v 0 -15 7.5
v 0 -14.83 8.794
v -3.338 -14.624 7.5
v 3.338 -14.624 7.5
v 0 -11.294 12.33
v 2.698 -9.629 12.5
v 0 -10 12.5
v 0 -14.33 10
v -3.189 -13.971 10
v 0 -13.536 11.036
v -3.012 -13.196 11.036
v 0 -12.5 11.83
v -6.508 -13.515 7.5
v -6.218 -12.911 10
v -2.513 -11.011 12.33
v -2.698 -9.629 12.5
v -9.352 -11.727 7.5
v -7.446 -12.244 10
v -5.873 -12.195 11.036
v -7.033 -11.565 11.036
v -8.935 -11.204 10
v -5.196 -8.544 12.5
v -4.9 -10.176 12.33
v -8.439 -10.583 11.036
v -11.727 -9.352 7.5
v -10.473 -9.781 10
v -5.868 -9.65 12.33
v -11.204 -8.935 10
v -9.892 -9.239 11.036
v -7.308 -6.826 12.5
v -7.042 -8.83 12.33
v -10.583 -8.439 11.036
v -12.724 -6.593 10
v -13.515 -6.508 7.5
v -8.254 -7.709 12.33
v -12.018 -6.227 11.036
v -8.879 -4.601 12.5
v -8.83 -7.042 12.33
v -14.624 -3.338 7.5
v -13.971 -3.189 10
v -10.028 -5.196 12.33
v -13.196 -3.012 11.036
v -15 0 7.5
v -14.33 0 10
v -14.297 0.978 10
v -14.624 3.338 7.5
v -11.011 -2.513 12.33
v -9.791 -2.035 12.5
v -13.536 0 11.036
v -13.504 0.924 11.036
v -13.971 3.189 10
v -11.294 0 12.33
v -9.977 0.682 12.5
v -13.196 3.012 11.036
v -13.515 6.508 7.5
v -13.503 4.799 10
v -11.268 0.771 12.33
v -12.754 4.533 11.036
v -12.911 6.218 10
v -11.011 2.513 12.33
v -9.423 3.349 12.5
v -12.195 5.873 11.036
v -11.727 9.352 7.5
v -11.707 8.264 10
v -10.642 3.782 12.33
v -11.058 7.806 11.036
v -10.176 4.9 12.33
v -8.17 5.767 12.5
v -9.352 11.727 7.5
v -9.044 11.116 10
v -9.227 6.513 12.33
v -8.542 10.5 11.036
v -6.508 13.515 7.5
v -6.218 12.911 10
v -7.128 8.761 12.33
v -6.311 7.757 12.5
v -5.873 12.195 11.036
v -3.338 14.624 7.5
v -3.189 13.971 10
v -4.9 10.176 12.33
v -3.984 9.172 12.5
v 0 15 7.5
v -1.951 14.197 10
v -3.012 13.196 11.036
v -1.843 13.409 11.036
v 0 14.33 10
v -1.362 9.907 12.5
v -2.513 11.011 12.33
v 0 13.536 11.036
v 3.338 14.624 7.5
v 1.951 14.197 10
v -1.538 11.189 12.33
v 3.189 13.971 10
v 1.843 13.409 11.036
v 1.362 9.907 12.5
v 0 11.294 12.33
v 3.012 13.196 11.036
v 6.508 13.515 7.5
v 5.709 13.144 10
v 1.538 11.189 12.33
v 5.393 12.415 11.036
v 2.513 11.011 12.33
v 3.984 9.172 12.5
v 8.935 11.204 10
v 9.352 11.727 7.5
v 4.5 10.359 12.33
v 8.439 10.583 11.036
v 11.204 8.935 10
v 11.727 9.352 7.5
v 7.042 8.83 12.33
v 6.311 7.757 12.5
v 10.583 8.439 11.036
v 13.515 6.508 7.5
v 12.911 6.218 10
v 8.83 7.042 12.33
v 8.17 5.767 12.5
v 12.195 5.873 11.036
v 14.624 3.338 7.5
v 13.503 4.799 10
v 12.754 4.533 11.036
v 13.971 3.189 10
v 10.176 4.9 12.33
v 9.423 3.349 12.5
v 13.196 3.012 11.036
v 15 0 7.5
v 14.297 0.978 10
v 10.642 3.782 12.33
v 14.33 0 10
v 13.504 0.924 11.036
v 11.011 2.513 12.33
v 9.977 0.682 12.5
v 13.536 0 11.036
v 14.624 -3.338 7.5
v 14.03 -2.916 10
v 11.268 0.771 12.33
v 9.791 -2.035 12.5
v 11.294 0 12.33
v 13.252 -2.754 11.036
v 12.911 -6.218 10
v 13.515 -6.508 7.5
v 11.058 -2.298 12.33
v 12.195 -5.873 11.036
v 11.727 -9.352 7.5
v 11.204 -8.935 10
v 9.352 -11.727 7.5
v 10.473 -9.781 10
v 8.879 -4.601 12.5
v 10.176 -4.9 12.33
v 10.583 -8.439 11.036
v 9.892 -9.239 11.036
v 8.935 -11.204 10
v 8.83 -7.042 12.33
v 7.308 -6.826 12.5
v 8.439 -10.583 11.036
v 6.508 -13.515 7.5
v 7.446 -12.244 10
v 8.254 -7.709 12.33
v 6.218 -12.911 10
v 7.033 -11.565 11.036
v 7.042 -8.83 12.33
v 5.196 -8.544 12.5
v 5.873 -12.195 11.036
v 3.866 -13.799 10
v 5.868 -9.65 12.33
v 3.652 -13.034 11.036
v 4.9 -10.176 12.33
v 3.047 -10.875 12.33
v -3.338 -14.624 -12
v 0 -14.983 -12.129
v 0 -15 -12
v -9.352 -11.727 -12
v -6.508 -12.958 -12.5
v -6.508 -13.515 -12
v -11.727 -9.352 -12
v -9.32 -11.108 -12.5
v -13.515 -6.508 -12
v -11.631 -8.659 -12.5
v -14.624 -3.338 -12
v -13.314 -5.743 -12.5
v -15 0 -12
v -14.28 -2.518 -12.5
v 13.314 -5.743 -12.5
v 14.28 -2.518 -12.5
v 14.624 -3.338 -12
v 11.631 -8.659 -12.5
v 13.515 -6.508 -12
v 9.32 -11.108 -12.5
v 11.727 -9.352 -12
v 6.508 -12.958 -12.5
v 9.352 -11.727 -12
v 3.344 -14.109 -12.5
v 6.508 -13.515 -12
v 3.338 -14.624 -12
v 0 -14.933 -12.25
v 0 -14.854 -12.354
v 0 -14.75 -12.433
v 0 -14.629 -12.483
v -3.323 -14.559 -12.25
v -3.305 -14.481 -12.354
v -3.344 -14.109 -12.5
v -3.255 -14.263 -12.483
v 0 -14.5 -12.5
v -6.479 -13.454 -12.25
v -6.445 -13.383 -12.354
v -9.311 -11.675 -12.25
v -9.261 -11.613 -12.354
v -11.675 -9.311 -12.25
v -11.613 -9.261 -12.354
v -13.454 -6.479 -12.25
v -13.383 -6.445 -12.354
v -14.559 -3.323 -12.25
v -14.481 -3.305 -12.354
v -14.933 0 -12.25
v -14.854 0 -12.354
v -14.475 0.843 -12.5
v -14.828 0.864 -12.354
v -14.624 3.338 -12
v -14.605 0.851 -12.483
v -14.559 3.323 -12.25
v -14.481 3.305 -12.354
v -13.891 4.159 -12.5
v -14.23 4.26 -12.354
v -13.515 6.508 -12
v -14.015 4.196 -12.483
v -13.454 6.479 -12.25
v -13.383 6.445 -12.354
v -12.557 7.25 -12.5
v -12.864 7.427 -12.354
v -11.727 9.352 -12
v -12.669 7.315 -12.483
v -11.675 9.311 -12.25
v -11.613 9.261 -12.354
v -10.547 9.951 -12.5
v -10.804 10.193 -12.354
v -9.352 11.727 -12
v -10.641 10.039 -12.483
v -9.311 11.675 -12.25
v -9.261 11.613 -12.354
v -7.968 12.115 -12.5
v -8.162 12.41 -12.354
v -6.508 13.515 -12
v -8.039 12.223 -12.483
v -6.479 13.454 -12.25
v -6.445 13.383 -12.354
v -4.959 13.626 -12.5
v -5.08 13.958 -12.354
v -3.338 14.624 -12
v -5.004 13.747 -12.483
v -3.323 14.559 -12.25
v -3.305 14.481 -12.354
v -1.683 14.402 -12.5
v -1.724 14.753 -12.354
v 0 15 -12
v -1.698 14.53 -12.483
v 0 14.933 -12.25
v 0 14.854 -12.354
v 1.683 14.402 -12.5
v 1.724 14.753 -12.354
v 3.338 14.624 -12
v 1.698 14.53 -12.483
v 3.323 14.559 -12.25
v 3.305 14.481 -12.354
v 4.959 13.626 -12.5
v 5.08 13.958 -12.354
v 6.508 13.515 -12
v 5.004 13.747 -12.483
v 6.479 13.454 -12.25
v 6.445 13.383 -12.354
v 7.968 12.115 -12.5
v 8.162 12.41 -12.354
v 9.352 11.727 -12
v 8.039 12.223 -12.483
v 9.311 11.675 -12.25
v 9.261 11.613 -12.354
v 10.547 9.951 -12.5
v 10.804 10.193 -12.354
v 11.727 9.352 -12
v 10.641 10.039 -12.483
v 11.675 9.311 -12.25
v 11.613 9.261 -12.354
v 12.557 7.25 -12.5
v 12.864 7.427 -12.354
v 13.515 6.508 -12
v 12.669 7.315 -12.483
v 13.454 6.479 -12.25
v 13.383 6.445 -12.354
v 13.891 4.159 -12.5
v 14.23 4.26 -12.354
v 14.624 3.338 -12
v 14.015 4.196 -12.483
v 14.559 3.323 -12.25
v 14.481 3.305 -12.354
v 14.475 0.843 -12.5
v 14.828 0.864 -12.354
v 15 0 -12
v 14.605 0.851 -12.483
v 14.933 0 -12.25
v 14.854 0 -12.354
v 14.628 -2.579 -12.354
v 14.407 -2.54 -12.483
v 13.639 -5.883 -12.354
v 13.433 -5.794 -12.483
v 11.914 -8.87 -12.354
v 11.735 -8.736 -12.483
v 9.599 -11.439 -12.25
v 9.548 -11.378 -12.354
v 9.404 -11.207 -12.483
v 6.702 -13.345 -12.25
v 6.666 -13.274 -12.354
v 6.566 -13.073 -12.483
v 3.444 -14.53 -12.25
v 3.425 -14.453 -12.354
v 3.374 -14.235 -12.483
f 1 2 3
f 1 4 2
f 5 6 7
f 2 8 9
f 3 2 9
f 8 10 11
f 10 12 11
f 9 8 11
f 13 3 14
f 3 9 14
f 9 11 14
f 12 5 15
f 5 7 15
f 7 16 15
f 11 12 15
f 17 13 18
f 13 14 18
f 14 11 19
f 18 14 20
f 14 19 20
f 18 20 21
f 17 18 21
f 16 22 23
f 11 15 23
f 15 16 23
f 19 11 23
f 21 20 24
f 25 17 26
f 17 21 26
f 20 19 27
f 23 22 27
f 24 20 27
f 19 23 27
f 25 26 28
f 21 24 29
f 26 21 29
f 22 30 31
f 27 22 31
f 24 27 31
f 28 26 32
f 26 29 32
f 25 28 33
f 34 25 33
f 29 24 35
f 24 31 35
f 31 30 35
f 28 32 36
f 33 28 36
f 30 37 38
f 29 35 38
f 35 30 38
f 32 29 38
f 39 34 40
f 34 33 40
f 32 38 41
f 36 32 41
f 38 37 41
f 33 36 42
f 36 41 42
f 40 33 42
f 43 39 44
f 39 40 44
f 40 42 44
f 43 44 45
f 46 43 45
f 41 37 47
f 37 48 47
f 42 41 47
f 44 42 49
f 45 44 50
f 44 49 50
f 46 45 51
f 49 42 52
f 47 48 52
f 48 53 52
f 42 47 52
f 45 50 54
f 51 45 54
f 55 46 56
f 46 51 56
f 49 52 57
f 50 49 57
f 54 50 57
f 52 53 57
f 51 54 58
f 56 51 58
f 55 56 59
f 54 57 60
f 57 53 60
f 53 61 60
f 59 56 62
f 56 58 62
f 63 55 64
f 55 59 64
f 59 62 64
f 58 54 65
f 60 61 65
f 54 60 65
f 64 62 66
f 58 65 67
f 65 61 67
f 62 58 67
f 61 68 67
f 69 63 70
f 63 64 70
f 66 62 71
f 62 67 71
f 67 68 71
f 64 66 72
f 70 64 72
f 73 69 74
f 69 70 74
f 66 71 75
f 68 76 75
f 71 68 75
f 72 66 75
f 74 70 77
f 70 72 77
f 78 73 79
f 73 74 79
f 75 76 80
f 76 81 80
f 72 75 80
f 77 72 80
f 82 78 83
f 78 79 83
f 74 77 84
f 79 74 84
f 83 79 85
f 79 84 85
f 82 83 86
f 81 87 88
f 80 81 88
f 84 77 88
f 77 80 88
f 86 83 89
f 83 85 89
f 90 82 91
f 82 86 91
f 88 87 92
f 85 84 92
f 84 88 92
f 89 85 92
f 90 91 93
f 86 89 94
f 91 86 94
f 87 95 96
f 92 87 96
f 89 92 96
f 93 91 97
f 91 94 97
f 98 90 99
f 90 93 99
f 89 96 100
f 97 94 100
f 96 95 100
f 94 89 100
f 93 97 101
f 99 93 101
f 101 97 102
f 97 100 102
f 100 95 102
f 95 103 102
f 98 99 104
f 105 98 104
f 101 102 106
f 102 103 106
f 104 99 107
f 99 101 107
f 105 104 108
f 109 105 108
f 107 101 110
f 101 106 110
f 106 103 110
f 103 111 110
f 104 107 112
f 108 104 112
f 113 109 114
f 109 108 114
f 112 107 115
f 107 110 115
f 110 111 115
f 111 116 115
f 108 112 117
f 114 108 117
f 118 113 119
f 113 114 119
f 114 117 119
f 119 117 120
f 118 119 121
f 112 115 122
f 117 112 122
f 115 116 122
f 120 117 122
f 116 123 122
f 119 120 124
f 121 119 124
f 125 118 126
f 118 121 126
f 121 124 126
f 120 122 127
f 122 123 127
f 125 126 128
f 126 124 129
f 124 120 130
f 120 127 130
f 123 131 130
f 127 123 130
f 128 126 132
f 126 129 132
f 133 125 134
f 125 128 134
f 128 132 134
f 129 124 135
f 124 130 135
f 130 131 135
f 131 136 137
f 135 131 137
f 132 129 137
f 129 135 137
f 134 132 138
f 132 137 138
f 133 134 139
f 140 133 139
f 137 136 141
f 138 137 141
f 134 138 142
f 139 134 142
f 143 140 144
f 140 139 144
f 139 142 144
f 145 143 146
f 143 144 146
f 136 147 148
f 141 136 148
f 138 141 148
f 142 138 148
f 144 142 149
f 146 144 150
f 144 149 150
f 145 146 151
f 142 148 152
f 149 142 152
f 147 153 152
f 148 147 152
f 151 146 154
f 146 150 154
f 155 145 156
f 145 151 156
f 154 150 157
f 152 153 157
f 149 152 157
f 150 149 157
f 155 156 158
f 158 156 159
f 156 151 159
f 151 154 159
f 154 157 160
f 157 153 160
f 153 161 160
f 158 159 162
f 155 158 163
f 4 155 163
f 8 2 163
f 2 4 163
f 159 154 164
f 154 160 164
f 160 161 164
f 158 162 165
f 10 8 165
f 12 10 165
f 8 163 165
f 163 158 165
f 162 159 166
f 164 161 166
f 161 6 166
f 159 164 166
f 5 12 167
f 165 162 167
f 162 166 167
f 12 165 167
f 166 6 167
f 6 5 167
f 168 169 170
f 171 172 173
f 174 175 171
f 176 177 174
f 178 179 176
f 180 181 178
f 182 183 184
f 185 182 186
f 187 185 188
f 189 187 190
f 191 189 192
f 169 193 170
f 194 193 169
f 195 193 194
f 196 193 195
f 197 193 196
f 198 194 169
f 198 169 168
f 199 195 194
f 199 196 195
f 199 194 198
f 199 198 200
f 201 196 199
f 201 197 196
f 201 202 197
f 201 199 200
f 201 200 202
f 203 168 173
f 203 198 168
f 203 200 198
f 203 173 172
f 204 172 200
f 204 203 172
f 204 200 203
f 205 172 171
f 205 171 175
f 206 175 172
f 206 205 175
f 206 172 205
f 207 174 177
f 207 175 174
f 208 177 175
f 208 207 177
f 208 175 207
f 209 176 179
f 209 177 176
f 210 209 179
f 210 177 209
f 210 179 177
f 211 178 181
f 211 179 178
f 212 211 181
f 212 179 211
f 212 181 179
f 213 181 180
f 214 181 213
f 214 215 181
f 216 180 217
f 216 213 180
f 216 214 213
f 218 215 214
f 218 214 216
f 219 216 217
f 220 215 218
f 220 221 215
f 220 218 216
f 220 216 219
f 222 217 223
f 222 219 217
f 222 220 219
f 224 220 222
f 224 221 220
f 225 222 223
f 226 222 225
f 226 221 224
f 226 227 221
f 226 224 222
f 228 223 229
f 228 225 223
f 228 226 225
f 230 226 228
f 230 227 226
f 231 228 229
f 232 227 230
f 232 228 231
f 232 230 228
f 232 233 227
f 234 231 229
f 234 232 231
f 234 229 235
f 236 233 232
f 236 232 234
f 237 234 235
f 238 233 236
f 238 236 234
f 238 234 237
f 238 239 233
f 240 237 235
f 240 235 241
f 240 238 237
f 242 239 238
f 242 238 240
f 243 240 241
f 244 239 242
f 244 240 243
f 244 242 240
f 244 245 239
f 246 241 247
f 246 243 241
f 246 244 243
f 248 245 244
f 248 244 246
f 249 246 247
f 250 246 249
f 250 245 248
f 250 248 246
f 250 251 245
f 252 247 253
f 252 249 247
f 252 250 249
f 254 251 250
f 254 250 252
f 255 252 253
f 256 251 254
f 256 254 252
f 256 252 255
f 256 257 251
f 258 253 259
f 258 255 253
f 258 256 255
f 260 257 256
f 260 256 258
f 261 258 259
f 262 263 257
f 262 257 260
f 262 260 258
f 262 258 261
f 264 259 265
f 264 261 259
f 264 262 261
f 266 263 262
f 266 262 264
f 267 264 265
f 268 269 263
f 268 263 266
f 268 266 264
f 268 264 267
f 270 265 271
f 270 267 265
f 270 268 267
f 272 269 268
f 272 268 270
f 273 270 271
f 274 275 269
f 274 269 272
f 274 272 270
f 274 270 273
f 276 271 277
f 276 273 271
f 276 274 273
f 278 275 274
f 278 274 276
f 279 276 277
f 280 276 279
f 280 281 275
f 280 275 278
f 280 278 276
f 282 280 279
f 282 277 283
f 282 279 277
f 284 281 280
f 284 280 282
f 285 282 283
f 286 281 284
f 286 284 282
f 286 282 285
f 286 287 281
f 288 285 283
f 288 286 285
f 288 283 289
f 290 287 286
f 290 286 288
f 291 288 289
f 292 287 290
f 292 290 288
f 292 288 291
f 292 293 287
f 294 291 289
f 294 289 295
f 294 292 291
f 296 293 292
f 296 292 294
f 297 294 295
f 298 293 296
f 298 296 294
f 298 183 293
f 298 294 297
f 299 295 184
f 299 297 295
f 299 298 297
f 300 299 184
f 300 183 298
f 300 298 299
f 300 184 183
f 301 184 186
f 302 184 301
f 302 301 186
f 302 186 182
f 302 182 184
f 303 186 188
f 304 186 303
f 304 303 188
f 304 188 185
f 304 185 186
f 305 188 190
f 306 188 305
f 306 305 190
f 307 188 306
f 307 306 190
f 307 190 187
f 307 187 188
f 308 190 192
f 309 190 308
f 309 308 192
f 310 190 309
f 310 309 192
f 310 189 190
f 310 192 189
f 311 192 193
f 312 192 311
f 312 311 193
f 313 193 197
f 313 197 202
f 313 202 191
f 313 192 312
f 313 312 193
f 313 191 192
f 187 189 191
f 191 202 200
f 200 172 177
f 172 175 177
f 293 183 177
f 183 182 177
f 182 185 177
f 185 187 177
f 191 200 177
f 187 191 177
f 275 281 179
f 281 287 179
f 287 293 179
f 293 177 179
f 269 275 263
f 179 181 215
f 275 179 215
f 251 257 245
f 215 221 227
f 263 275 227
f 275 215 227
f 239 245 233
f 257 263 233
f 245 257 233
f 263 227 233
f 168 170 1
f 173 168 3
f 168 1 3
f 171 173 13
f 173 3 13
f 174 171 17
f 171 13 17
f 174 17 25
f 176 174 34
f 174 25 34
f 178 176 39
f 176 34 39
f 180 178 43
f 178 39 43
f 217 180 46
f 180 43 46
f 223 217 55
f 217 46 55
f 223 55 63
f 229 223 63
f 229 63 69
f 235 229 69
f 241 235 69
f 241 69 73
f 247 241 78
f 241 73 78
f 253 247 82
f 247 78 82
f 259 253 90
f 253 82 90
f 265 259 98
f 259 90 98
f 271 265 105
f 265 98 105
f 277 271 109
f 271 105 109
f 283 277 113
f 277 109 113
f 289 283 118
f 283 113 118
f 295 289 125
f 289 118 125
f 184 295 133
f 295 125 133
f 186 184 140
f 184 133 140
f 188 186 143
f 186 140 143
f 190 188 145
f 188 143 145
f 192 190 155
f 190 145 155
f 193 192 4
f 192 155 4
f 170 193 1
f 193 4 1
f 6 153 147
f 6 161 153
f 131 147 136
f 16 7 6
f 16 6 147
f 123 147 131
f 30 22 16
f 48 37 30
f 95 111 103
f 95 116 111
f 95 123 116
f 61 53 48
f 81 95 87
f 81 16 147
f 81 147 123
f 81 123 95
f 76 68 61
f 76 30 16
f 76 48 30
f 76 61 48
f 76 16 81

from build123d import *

# Parameters (mm, degrees)
SKETCH1_W = 15
SKETCH1_H = 25
FILLET1_R = 5
FILLET2_R = 0.5


with BuildPart() as part:
    # Sketch1 → Revolve1 (revolve)
    with BuildSketch(Plane.YZ, mode=Mode.PRIVATE) as revolve1_sk:
        with Locations((7.5, 0)):
            Rectangle(SKETCH1_W, SKETCH1_H)
    revolve(revolve1_sk.sketch.rotate(Axis((0, 0, 22.327044025), (0, 0, -1)), 180), axis=Axis((0, 0, 22.327044025), (0, 0, -1)))

    # Fillet1
    fillet1_edges = [part.edges().sort_by_distance(p)[0] for p in [
        (0, 15, 12.5),
    ]]
    fillet(fillet1_edges, radius=FILLET1_R)

    # Fillet2
    fillet2_edges = [part.edges().sort_by_distance(p)[0] for p in [
        (0, 15, -12.5),
    ]]
    fillet(fillet2_edges, radius=FILLET2_R)


solid = part.part
